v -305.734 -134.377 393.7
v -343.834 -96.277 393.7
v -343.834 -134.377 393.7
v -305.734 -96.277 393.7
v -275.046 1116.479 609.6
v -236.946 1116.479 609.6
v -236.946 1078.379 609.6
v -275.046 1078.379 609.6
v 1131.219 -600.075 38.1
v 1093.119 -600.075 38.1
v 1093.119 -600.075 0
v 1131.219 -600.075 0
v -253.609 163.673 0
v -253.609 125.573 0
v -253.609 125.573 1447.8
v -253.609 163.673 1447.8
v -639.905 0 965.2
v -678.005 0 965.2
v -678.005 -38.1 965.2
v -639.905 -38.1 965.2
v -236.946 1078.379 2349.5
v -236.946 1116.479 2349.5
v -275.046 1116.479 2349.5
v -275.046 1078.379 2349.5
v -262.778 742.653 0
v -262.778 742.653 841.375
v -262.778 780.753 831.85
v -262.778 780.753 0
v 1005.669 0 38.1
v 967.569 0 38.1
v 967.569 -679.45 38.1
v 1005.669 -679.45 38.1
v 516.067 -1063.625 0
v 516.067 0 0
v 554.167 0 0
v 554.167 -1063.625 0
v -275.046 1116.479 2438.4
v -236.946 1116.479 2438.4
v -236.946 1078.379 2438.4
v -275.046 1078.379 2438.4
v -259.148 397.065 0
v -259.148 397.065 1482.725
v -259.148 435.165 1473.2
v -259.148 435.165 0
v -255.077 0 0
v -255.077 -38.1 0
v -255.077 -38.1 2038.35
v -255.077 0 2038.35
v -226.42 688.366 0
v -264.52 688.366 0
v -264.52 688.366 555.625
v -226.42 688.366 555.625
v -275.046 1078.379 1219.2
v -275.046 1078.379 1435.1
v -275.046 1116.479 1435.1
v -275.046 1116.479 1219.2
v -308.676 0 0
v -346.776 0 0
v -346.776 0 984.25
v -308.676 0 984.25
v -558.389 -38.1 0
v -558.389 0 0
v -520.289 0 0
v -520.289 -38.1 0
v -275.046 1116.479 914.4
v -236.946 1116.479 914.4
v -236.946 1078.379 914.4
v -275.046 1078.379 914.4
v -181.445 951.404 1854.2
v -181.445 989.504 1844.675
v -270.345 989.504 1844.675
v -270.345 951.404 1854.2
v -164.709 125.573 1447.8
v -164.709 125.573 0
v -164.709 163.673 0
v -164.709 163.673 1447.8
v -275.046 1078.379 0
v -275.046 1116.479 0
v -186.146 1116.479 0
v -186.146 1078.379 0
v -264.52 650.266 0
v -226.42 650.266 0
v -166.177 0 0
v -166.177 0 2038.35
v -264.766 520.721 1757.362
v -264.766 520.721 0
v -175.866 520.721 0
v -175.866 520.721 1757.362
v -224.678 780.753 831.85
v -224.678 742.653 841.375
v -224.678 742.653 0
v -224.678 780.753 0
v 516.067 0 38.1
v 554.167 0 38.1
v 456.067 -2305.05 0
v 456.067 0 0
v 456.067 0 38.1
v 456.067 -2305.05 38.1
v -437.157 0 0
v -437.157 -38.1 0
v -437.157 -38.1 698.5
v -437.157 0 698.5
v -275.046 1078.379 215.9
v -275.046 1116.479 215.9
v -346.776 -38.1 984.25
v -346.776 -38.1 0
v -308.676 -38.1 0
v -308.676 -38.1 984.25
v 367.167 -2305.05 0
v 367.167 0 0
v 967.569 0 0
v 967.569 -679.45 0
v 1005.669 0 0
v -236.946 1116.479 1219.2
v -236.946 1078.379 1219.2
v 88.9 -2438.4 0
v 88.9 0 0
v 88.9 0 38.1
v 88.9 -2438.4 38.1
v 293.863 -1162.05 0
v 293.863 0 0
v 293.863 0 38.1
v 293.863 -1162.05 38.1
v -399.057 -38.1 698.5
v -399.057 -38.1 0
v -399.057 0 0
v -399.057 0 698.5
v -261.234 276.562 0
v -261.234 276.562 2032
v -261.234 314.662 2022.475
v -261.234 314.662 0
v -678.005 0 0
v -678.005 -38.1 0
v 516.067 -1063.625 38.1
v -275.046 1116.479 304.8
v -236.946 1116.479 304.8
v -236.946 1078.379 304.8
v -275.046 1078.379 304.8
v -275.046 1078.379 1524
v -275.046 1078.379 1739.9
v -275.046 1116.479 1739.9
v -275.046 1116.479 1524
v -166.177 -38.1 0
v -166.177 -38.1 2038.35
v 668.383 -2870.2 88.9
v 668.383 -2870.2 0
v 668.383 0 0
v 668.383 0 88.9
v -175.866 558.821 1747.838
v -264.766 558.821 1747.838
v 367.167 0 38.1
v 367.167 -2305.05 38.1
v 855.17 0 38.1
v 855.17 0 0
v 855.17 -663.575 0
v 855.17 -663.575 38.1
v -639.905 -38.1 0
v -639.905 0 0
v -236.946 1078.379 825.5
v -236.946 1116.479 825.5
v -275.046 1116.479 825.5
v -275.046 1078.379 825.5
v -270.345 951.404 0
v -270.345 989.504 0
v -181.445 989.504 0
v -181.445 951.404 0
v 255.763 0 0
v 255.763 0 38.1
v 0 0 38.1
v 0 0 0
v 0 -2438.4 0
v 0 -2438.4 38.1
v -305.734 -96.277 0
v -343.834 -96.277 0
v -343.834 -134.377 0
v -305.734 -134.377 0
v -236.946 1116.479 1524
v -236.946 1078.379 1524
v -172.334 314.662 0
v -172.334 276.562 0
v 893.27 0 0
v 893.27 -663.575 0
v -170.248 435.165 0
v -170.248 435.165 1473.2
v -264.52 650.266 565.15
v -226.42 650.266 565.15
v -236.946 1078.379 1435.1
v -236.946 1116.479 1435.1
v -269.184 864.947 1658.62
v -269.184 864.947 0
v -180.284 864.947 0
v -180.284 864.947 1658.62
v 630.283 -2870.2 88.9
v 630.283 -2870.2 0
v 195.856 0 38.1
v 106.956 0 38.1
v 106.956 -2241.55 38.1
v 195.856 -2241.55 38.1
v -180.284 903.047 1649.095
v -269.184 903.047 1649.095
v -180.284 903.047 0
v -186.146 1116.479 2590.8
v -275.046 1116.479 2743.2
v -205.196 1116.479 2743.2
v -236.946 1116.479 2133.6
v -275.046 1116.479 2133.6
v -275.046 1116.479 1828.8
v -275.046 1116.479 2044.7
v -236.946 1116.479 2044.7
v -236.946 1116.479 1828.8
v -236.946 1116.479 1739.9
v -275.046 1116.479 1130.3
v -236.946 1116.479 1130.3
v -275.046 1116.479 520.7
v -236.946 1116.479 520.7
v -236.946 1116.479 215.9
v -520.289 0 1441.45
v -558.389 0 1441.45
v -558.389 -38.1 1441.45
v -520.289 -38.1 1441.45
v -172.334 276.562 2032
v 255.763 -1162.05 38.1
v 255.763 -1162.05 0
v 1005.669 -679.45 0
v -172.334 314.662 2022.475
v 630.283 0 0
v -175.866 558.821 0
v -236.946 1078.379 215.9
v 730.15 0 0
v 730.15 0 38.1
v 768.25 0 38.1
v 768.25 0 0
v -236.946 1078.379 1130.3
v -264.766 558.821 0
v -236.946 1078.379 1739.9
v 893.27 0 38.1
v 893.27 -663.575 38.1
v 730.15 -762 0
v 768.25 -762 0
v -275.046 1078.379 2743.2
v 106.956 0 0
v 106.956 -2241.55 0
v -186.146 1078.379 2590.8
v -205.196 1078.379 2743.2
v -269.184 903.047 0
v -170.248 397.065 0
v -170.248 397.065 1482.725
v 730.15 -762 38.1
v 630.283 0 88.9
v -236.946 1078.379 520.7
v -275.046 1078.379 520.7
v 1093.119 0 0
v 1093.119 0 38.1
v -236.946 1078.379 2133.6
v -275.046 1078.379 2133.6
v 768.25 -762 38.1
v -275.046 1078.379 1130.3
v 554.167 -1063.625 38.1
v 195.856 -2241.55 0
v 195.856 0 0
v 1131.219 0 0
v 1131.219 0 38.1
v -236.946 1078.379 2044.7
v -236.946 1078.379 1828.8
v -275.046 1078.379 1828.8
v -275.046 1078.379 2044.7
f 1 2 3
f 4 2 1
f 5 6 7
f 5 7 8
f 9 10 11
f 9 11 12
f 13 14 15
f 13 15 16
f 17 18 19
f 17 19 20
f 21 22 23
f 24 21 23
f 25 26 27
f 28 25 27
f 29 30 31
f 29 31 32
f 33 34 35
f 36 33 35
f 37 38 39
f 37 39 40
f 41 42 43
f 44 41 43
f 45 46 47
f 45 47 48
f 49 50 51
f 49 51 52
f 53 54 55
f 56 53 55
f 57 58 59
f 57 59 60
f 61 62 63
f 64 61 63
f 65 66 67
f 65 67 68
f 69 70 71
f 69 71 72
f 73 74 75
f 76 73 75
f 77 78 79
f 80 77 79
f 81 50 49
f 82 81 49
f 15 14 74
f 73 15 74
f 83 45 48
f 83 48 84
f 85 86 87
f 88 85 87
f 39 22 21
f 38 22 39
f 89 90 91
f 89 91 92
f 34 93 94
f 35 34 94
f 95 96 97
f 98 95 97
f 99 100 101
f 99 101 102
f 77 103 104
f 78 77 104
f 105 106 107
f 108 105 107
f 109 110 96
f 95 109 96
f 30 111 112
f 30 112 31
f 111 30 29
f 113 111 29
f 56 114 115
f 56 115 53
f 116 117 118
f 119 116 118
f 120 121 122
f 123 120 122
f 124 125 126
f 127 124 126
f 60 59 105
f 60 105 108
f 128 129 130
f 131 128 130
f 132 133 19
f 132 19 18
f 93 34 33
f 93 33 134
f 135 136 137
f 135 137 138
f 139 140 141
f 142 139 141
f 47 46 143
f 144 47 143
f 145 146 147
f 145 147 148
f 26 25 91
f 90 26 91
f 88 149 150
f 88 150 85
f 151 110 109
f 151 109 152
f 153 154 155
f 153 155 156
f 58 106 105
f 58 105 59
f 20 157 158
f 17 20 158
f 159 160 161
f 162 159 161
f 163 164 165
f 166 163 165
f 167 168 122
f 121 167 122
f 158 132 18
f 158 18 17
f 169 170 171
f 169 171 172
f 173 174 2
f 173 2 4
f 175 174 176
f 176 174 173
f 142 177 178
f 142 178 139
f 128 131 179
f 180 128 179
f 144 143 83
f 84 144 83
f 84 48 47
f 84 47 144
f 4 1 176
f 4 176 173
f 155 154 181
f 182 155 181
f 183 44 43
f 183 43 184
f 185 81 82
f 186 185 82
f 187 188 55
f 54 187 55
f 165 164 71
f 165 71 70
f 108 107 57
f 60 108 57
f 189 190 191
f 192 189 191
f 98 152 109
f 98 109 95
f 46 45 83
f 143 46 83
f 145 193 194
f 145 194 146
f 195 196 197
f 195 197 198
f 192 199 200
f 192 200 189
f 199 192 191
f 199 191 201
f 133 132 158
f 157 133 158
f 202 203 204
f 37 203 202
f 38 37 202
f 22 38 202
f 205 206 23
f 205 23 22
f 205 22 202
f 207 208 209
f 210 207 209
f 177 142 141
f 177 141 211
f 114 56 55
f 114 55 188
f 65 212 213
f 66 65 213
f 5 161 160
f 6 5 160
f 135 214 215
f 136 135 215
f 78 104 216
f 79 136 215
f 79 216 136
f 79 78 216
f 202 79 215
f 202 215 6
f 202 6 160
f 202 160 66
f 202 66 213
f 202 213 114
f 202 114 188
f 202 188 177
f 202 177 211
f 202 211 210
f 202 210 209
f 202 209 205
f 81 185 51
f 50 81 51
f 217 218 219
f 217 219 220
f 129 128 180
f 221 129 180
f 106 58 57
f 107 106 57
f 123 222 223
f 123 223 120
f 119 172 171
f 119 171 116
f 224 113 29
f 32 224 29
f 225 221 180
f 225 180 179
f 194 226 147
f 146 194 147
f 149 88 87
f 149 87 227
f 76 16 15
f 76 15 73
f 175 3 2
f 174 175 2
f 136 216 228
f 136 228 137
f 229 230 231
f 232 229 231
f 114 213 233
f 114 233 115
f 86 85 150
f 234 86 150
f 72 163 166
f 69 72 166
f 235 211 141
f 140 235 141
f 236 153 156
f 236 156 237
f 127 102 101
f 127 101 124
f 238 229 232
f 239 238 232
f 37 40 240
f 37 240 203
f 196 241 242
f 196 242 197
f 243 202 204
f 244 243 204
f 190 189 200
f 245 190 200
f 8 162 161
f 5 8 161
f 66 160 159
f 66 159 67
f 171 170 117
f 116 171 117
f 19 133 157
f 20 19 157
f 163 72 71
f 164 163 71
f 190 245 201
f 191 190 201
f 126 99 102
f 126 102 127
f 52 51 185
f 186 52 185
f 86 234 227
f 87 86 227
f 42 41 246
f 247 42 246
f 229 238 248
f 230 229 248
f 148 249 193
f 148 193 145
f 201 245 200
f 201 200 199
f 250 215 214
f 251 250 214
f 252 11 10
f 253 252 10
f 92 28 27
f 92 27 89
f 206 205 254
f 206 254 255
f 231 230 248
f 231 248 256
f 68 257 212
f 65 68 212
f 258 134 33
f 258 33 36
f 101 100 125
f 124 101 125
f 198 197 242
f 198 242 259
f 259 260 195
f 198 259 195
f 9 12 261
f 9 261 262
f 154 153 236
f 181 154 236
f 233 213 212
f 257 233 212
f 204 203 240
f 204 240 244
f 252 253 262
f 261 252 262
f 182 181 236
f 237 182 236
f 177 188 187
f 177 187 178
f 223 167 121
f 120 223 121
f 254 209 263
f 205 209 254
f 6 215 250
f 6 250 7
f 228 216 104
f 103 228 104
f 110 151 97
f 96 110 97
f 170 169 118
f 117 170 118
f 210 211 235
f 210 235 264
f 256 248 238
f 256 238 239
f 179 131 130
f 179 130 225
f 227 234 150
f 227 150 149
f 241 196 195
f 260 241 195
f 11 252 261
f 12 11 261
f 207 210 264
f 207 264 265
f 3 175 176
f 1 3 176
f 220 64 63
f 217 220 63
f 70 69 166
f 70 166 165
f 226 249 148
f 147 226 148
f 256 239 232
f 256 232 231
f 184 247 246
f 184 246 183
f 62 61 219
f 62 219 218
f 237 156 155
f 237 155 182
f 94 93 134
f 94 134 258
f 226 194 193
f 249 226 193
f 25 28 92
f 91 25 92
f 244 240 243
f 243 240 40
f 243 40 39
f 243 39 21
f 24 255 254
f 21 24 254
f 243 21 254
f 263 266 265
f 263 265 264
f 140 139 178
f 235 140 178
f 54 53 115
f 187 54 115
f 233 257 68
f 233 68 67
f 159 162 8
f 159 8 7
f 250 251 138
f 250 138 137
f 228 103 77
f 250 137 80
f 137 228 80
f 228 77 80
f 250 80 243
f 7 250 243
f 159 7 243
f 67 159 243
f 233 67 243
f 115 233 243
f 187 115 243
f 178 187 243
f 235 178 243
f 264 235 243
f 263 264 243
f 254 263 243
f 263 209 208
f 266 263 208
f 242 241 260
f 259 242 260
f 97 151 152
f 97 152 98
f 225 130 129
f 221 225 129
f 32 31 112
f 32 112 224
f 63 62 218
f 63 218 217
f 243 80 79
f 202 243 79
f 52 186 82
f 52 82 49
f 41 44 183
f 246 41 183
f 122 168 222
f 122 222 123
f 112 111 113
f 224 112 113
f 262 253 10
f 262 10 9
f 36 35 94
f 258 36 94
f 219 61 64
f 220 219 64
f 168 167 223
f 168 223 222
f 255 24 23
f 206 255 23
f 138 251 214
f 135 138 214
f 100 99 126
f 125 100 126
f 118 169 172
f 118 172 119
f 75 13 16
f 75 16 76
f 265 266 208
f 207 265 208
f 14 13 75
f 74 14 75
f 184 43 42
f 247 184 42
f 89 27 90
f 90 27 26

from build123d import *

# Parameters (mm, degrees)
F0_W      = 88.9
F0_H      = 38.1
F1_DEPTH  = 2438.4
F2_W      = 88.9
F2_H      = 38.1
F3_DEPTH  = 2241.55
F4_W      = 88.9
F4_H      = 38.1
F5_DEPTH  = 2038.35
F6_W      = 38.1
F6_H      = 38.1
F7_DEPTH  = 1162.05
F8_W      = 38.1
F8_H      = 38.1
F9_DEPTH  = 984.25
F10_W     = 38.1
F10_H     = 38.1
F11_DEPTH = 698.5
F12_W     = 88.9
F12_H     = 38.1
F13_DEPTH = 1447.8
F14_W     = 38.1
F14_H     = 38.1
F15_DEPTH = 393.7
F16_W     = 88.9
F16_H     = 38.1
F17_DEPTH = 2032
F19_DEPTH = 101.6
F20_W     = 88.9
F20_H     = 38.1
F21_DEPTH = 1482.725
F23_DEPTH = 101.6
F24_W     = 88.9
F24_H     = 38.1
F25_DEPTH = 2305.05
F26_W     = 88.9
F26_H     = 38.1
F27_DEPTH = 1757.3625
F29_DEPTH = 88.9
F30_W     = 38.1
F30_H     = 38.1
F31_DEPTH = 1063.625
F32_W     = 38.1
F32_H     = 38.1
F33_DEPTH = 565.15
F35_DEPTH = 101.6
F36_W     = 38.1
F36_H     = 38.1
F37_DEPTH = 841.375
F39_DEPTH = 38.1
F40_W     = 38.1
F40_H     = 88.9
F41_DEPTH = 2870.2
F42_W     = 88.9
F42_H     = 38.1
F43_DEPTH = 1658.62
F45_DEPTH = 88.9
F46_W     = 88.9
F46_H     = 38.1
F47_DEPTH = 1854.2
F49_DEPTH = 88.9
F50_W     = 38.1
F50_H     = 38.1
F51_DEPTH = 762
F52_W     = 38.1
F52_H     = 38.1
F53_DEPTH = 663.575
F54_W     = 38.1
F54_H     = 38.1
F55_DEPTH = 1441.45
F56_W     = 38.1
F56_H     = 38.1
F57_DEPTH = 679.45
F58_W     = 38.1
F58_H     = 38.1
F59_DEPTH = 600.075
F60_W     = 38.1
F60_H     = 38.1
F61_DEPTH = 965.2
F62_W     = 88.9
F62_H     = 38.1
F63_DEPTH = 2743.2
F64_W     = 38.1
F64_H     = 88.9
F65_DEPTH = 38.1


with BuildPart() as f1:
    # F0 (on Front) → F1 (new body)
    with BuildSketch(Plane.XZ):
        with Locations((44.45, 19.05)):
            Rectangle(F0_W, F0_H)
    extrude(amount=F1_DEPTH)


with BuildPart() as f3:
    # F2 (on Front) → F3 (new body)
    with BuildSketch(Plane.XZ):
        with Locations((151.405934, 19.05)):
            Rectangle(F2_W, F2_H)
    extrude(amount=F3_DEPTH)


with BuildPart() as f5:
    # F4 (on Top) → F5 (new body)
    with BuildSketch(Plane.XY):
        with Locations((-210.627121, -19.05)):
            Rectangle(F4_W, F4_H)
    extrude(amount=F5_DEPTH)


with BuildPart() as f7:
    # F6 (on Front) → F7 (new body)
    with BuildSketch(Plane.XZ):
        with Locations((274.813263, 19.05)):
            Rectangle(F6_W, F6_H)
    extrude(amount=F7_DEPTH)


with BuildPart() as f9:
    # F8 (on Top) → F9 (new body)
    with BuildSketch(Plane.XY):
        with Locations((-327.726066, -19.05)):
            Rectangle(F8_W, F8_H)
    extrude(amount=F9_DEPTH)


with BuildPart() as f11:
    # F10 (on Top) → F11 (new body)
    with BuildSketch(Plane.XY):
        with Locations((-418.106679, -19.05)):
            Rectangle(F10_W, F10_H)
    extrude(amount=F11_DEPTH)


with BuildPart() as f13:
    # F12 (on Top) → F13 (new body)
    with BuildSketch(Plane.XY):
        with Locations((-209.159441, 144.622839)):
            Rectangle(F12_W, F12_H)
    extrude(amount=F13_DEPTH)


with BuildPart() as f15:
    # F14 (on Top) → F15 (new body)
    with BuildSketch(Plane.XY):
        with Locations((-324.783623, -115.327258)):
            Rectangle(F14_W, F14_H)
    extrude(amount=F15_DEPTH)


with BuildPart() as f17:
    # F16 (on Top) → F17 (new body)
    with BuildSketch(Plane.XY):
        with Locations((-216.784082, 295.611974)):
            Rectangle(F16_W, F16_H)
    extrude(amount=F17_DEPTH)

    # F18 (on face) → F19 (cut)
    with BuildSketch(Plane(origin=(-261.234082, 0, 0), x_dir=(0, -1, 0), z_dir=(-1, 0, 0))):
        Polygon((-314.661974, 2022.475), (-276.561974, 2032), (-314.661974, 2032), align=None)
    extrude(amount=-F19_DEPTH, mode=Mode.SUBTRACT)


with BuildPart() as f21:
    # F20 (on Top) → F21 (new body)
    with BuildSketch(Plane.XY):
        with Locations((-214.697614, 416.115001)):
            Rectangle(F20_W, F20_H)
    extrude(amount=F21_DEPTH)

    # F22 (on face) → F23 (cut)
    with BuildSketch(Plane(origin=(-259.147614, 0, 0), x_dir=(0, -1, 0), z_dir=(-1, 0, 0))):
        Polygon((-435.165001, 1473.2), (-397.065001, 1482.725), (-435.165001, 1482.725), align=None)
    extrude(amount=-F23_DEPTH, mode=Mode.SUBTRACT)


with BuildPart() as f25:
    # F24 (on Front) → F25 (new body)
    with BuildSketch(Plane.XZ):
        with Locations((411.617358, 19.05)):
            Rectangle(F24_W, F24_H)
    extrude(amount=F25_DEPTH)


with BuildPart() as f27:
    # F26 (on Top) → F27 (new body)
    with BuildSketch(Plane.XY):
        with Locations((-220.315881, 539.771175)):
            Rectangle(F26_W, F26_H)
    extrude(amount=F27_DEPTH)

    # F28 (on face) → F29 (cut)
    with BuildSketch(Plane(origin=(-264.765881, 0, 0), x_dir=(0, -1, 0), z_dir=(-1, 0, 0))):
        Polygon((-558.821175, 1747.8375), (-520.721175, 1757.3625), (-558.821175, 1757.3625), align=None)
    extrude(amount=-F29_DEPTH, mode=Mode.SUBTRACT)


with BuildPart() as f31:
    # F30 (on Front) → F31 (new body)
    with BuildSketch(Plane.XZ):
        with Locations((535.116774, 19.05)):
            Rectangle(F30_W, F30_H)
    extrude(amount=F31_DEPTH)


with BuildPart() as f33:
    # F32 (on Top) → F33 (new body)
    with BuildSketch(Plane.XY):
        with Locations((-245.47028, 669.316311)):
            Rectangle(F32_W, F32_H)
    extrude(amount=F33_DEPTH)

    # F34 (on face) → F35 (cut)
    with BuildSketch(Plane(origin=(-264.52028, 0, 0), x_dir=(0, -1, 0), z_dir=(-1, 0, 0))):
        Polygon((-688.366311, 555.625), (-650.266311, 565.15), (-688.366311, 565.15), align=None)
    extrude(amount=-F35_DEPTH, mode=Mode.SUBTRACT)


with BuildPart() as f37:
    # F36 (on Top) → F37 (new body)
    with BuildSketch(Plane.XY):
        with Locations((-243.727744, 761.703074)):
            Rectangle(F36_W, F36_H)
    extrude(amount=F37_DEPTH)

    # F38 (on face) → F39 (cut)
    with BuildSketch(Plane(origin=(-262.777744, 0, 0), x_dir=(0, -1, 0), z_dir=(-1, 0, 0))):
        Polygon((-780.753074, 831.85), (-742.653074, 841.375), (-780.753074, 841.375), align=None)
    extrude(amount=-F39_DEPTH, mode=Mode.SUBTRACT)


with BuildPart() as f41:
    # F40 (on Front) → F41 (new body)
    with BuildSketch(Plane.XZ):
        with Locations((649.33302, 44.45)):
            Rectangle(F40_W, F40_H)
    extrude(amount=F41_DEPTH)


with BuildPart() as f43:
    # F42 (on Top) → F43 (new body)
    with BuildSketch(Plane.XY):
        with Locations((-224.733897, 883.997038)):
            Rectangle(F42_W, F42_H)
    extrude(amount=F43_DEPTH)

    # F44 (on face) → F45 (cut)
    with BuildSketch(Plane(origin=(-269.183897, 0, 0), x_dir=(0, -1, 0), z_dir=(-1, 0, 0))):
        Polygon((-903.047038, 1649.095), (-864.947038, 1658.62), (-903.047038, 1658.62), align=None)
    extrude(amount=-F45_DEPTH, mode=Mode.SUBTRACT)


with BuildPart() as f47:
    # F46 (on Top) → F47 (new body)
    with BuildSketch(Plane.XY):
        with Locations((-225.894965, 970.454122)):
            Rectangle(F46_W, F46_H)
    extrude(amount=F47_DEPTH)

    # F48 (on face) → F49 (cut)
    with BuildSketch(Plane(origin=(-270.344965, 0, 0), x_dir=(0, -1, 0), z_dir=(-1, 0, 0))):
        Polygon((-989.504122, 1844.675), (-951.404122, 1854.2), (-989.504122, 1854.2), align=None)
    extrude(amount=-F49_DEPTH, mode=Mode.SUBTRACT)


with BuildPart() as f51:
    # F50 (on Front) → F51 (new body)
    with BuildSketch(Plane.XZ):
        with Locations((749.199772, 19.05)):
            Rectangle(F50_W, F50_H)
    extrude(amount=F51_DEPTH)


with BuildPart() as f53:
    # F52 (on Front) → F53 (new body)
    with BuildSketch(Plane.XZ):
        with Locations((874.22016, 19.05)):
            Rectangle(F52_W, F52_H)
    extrude(amount=F53_DEPTH)


with BuildPart() as f55:
    # F54 (on Top) → F55 (new body)
    with BuildSketch(Plane.XY):
        with Locations((-539.338981, -19.05)):
            Rectangle(F54_W, F54_H)
    extrude(amount=F55_DEPTH)


with BuildPart() as f57:
    # F56 (on Front) → F57 (new body)
    with BuildSketch(Plane.XZ):
        with Locations((986.619183, 19.05)):
            Rectangle(F56_W, F56_H)
    extrude(amount=F57_DEPTH)


with BuildPart() as f59:
    # F58 (on Front) → F59 (new body)
    with BuildSketch(Plane.XZ):
        with Locations((1112.169187, 19.05)):
            Rectangle(F58_W, F58_H)
    extrude(amount=F59_DEPTH)


with BuildPart() as f61:
    # F60 (on Top) → F61 (new body)
    with BuildSketch(Plane.XY):
        with Locations((-658.954722, -19.05)):
            Rectangle(F60_W, F60_H)
    extrude(amount=F61_DEPTH)


with BuildPart() as f63:
    # F62 (on Top) → F63 (new body)
    with BuildSketch(Plane.XY):
        with Locations((-230.595849, 1097.428597)):
            Rectangle(F62_W, F62_H)
    extrude(amount=F63_DEPTH)

    # F64 (on face) → F65 (cut)
    with BuildSketch(Plane(origin=(0, 1116.478597, 0), x_dir=(-1, 0, 0), z_dir=(0, 1, 0))):
        Polygon((186.145849, 2743.2), (186.145849, 2590.8), (205.195849, 2743.2), align=None)
        with Locations((255.995849, 260.35)):
            Rectangle(F64_W, F64_H)
        with Locations((255.995849, 565.15)):
            Rectangle(F64_W, F64_H)
        with Locations((255.995849, 869.95)):
            Rectangle(F64_W, F64_H)
        with Locations((255.995849, 1174.75)):
            Rectangle(F64_W, F64_H)
        with Locations((255.995849, 1479.55)):
            Rectangle(F64_W, F64_H)
        with Locations((255.995849, 1784.35)):
            Rectangle(F64_W, F64_H)
        with Locations((255.995849, 2089.15)):
            Rectangle(F64_W, F64_H)
        with Locations((255.995849, 2393.95)):
            Rectangle(F64_W, F64_H)
    extrude(amount=-F65_DEPTH, mode=Mode.SUBTRACT)


solid = Compound([f1.part, f3.part, f5.part, f7.part, f9.part, f11.part, f13.part, f15.part, f17.part, f21.part, f25.part, f27.part, f31.part, f33.part, f37.part, f41.part, f43.part, f47.part, f51.part, f53.part, f55.part, f57.part, f59.part, f61.part, f63.part])
